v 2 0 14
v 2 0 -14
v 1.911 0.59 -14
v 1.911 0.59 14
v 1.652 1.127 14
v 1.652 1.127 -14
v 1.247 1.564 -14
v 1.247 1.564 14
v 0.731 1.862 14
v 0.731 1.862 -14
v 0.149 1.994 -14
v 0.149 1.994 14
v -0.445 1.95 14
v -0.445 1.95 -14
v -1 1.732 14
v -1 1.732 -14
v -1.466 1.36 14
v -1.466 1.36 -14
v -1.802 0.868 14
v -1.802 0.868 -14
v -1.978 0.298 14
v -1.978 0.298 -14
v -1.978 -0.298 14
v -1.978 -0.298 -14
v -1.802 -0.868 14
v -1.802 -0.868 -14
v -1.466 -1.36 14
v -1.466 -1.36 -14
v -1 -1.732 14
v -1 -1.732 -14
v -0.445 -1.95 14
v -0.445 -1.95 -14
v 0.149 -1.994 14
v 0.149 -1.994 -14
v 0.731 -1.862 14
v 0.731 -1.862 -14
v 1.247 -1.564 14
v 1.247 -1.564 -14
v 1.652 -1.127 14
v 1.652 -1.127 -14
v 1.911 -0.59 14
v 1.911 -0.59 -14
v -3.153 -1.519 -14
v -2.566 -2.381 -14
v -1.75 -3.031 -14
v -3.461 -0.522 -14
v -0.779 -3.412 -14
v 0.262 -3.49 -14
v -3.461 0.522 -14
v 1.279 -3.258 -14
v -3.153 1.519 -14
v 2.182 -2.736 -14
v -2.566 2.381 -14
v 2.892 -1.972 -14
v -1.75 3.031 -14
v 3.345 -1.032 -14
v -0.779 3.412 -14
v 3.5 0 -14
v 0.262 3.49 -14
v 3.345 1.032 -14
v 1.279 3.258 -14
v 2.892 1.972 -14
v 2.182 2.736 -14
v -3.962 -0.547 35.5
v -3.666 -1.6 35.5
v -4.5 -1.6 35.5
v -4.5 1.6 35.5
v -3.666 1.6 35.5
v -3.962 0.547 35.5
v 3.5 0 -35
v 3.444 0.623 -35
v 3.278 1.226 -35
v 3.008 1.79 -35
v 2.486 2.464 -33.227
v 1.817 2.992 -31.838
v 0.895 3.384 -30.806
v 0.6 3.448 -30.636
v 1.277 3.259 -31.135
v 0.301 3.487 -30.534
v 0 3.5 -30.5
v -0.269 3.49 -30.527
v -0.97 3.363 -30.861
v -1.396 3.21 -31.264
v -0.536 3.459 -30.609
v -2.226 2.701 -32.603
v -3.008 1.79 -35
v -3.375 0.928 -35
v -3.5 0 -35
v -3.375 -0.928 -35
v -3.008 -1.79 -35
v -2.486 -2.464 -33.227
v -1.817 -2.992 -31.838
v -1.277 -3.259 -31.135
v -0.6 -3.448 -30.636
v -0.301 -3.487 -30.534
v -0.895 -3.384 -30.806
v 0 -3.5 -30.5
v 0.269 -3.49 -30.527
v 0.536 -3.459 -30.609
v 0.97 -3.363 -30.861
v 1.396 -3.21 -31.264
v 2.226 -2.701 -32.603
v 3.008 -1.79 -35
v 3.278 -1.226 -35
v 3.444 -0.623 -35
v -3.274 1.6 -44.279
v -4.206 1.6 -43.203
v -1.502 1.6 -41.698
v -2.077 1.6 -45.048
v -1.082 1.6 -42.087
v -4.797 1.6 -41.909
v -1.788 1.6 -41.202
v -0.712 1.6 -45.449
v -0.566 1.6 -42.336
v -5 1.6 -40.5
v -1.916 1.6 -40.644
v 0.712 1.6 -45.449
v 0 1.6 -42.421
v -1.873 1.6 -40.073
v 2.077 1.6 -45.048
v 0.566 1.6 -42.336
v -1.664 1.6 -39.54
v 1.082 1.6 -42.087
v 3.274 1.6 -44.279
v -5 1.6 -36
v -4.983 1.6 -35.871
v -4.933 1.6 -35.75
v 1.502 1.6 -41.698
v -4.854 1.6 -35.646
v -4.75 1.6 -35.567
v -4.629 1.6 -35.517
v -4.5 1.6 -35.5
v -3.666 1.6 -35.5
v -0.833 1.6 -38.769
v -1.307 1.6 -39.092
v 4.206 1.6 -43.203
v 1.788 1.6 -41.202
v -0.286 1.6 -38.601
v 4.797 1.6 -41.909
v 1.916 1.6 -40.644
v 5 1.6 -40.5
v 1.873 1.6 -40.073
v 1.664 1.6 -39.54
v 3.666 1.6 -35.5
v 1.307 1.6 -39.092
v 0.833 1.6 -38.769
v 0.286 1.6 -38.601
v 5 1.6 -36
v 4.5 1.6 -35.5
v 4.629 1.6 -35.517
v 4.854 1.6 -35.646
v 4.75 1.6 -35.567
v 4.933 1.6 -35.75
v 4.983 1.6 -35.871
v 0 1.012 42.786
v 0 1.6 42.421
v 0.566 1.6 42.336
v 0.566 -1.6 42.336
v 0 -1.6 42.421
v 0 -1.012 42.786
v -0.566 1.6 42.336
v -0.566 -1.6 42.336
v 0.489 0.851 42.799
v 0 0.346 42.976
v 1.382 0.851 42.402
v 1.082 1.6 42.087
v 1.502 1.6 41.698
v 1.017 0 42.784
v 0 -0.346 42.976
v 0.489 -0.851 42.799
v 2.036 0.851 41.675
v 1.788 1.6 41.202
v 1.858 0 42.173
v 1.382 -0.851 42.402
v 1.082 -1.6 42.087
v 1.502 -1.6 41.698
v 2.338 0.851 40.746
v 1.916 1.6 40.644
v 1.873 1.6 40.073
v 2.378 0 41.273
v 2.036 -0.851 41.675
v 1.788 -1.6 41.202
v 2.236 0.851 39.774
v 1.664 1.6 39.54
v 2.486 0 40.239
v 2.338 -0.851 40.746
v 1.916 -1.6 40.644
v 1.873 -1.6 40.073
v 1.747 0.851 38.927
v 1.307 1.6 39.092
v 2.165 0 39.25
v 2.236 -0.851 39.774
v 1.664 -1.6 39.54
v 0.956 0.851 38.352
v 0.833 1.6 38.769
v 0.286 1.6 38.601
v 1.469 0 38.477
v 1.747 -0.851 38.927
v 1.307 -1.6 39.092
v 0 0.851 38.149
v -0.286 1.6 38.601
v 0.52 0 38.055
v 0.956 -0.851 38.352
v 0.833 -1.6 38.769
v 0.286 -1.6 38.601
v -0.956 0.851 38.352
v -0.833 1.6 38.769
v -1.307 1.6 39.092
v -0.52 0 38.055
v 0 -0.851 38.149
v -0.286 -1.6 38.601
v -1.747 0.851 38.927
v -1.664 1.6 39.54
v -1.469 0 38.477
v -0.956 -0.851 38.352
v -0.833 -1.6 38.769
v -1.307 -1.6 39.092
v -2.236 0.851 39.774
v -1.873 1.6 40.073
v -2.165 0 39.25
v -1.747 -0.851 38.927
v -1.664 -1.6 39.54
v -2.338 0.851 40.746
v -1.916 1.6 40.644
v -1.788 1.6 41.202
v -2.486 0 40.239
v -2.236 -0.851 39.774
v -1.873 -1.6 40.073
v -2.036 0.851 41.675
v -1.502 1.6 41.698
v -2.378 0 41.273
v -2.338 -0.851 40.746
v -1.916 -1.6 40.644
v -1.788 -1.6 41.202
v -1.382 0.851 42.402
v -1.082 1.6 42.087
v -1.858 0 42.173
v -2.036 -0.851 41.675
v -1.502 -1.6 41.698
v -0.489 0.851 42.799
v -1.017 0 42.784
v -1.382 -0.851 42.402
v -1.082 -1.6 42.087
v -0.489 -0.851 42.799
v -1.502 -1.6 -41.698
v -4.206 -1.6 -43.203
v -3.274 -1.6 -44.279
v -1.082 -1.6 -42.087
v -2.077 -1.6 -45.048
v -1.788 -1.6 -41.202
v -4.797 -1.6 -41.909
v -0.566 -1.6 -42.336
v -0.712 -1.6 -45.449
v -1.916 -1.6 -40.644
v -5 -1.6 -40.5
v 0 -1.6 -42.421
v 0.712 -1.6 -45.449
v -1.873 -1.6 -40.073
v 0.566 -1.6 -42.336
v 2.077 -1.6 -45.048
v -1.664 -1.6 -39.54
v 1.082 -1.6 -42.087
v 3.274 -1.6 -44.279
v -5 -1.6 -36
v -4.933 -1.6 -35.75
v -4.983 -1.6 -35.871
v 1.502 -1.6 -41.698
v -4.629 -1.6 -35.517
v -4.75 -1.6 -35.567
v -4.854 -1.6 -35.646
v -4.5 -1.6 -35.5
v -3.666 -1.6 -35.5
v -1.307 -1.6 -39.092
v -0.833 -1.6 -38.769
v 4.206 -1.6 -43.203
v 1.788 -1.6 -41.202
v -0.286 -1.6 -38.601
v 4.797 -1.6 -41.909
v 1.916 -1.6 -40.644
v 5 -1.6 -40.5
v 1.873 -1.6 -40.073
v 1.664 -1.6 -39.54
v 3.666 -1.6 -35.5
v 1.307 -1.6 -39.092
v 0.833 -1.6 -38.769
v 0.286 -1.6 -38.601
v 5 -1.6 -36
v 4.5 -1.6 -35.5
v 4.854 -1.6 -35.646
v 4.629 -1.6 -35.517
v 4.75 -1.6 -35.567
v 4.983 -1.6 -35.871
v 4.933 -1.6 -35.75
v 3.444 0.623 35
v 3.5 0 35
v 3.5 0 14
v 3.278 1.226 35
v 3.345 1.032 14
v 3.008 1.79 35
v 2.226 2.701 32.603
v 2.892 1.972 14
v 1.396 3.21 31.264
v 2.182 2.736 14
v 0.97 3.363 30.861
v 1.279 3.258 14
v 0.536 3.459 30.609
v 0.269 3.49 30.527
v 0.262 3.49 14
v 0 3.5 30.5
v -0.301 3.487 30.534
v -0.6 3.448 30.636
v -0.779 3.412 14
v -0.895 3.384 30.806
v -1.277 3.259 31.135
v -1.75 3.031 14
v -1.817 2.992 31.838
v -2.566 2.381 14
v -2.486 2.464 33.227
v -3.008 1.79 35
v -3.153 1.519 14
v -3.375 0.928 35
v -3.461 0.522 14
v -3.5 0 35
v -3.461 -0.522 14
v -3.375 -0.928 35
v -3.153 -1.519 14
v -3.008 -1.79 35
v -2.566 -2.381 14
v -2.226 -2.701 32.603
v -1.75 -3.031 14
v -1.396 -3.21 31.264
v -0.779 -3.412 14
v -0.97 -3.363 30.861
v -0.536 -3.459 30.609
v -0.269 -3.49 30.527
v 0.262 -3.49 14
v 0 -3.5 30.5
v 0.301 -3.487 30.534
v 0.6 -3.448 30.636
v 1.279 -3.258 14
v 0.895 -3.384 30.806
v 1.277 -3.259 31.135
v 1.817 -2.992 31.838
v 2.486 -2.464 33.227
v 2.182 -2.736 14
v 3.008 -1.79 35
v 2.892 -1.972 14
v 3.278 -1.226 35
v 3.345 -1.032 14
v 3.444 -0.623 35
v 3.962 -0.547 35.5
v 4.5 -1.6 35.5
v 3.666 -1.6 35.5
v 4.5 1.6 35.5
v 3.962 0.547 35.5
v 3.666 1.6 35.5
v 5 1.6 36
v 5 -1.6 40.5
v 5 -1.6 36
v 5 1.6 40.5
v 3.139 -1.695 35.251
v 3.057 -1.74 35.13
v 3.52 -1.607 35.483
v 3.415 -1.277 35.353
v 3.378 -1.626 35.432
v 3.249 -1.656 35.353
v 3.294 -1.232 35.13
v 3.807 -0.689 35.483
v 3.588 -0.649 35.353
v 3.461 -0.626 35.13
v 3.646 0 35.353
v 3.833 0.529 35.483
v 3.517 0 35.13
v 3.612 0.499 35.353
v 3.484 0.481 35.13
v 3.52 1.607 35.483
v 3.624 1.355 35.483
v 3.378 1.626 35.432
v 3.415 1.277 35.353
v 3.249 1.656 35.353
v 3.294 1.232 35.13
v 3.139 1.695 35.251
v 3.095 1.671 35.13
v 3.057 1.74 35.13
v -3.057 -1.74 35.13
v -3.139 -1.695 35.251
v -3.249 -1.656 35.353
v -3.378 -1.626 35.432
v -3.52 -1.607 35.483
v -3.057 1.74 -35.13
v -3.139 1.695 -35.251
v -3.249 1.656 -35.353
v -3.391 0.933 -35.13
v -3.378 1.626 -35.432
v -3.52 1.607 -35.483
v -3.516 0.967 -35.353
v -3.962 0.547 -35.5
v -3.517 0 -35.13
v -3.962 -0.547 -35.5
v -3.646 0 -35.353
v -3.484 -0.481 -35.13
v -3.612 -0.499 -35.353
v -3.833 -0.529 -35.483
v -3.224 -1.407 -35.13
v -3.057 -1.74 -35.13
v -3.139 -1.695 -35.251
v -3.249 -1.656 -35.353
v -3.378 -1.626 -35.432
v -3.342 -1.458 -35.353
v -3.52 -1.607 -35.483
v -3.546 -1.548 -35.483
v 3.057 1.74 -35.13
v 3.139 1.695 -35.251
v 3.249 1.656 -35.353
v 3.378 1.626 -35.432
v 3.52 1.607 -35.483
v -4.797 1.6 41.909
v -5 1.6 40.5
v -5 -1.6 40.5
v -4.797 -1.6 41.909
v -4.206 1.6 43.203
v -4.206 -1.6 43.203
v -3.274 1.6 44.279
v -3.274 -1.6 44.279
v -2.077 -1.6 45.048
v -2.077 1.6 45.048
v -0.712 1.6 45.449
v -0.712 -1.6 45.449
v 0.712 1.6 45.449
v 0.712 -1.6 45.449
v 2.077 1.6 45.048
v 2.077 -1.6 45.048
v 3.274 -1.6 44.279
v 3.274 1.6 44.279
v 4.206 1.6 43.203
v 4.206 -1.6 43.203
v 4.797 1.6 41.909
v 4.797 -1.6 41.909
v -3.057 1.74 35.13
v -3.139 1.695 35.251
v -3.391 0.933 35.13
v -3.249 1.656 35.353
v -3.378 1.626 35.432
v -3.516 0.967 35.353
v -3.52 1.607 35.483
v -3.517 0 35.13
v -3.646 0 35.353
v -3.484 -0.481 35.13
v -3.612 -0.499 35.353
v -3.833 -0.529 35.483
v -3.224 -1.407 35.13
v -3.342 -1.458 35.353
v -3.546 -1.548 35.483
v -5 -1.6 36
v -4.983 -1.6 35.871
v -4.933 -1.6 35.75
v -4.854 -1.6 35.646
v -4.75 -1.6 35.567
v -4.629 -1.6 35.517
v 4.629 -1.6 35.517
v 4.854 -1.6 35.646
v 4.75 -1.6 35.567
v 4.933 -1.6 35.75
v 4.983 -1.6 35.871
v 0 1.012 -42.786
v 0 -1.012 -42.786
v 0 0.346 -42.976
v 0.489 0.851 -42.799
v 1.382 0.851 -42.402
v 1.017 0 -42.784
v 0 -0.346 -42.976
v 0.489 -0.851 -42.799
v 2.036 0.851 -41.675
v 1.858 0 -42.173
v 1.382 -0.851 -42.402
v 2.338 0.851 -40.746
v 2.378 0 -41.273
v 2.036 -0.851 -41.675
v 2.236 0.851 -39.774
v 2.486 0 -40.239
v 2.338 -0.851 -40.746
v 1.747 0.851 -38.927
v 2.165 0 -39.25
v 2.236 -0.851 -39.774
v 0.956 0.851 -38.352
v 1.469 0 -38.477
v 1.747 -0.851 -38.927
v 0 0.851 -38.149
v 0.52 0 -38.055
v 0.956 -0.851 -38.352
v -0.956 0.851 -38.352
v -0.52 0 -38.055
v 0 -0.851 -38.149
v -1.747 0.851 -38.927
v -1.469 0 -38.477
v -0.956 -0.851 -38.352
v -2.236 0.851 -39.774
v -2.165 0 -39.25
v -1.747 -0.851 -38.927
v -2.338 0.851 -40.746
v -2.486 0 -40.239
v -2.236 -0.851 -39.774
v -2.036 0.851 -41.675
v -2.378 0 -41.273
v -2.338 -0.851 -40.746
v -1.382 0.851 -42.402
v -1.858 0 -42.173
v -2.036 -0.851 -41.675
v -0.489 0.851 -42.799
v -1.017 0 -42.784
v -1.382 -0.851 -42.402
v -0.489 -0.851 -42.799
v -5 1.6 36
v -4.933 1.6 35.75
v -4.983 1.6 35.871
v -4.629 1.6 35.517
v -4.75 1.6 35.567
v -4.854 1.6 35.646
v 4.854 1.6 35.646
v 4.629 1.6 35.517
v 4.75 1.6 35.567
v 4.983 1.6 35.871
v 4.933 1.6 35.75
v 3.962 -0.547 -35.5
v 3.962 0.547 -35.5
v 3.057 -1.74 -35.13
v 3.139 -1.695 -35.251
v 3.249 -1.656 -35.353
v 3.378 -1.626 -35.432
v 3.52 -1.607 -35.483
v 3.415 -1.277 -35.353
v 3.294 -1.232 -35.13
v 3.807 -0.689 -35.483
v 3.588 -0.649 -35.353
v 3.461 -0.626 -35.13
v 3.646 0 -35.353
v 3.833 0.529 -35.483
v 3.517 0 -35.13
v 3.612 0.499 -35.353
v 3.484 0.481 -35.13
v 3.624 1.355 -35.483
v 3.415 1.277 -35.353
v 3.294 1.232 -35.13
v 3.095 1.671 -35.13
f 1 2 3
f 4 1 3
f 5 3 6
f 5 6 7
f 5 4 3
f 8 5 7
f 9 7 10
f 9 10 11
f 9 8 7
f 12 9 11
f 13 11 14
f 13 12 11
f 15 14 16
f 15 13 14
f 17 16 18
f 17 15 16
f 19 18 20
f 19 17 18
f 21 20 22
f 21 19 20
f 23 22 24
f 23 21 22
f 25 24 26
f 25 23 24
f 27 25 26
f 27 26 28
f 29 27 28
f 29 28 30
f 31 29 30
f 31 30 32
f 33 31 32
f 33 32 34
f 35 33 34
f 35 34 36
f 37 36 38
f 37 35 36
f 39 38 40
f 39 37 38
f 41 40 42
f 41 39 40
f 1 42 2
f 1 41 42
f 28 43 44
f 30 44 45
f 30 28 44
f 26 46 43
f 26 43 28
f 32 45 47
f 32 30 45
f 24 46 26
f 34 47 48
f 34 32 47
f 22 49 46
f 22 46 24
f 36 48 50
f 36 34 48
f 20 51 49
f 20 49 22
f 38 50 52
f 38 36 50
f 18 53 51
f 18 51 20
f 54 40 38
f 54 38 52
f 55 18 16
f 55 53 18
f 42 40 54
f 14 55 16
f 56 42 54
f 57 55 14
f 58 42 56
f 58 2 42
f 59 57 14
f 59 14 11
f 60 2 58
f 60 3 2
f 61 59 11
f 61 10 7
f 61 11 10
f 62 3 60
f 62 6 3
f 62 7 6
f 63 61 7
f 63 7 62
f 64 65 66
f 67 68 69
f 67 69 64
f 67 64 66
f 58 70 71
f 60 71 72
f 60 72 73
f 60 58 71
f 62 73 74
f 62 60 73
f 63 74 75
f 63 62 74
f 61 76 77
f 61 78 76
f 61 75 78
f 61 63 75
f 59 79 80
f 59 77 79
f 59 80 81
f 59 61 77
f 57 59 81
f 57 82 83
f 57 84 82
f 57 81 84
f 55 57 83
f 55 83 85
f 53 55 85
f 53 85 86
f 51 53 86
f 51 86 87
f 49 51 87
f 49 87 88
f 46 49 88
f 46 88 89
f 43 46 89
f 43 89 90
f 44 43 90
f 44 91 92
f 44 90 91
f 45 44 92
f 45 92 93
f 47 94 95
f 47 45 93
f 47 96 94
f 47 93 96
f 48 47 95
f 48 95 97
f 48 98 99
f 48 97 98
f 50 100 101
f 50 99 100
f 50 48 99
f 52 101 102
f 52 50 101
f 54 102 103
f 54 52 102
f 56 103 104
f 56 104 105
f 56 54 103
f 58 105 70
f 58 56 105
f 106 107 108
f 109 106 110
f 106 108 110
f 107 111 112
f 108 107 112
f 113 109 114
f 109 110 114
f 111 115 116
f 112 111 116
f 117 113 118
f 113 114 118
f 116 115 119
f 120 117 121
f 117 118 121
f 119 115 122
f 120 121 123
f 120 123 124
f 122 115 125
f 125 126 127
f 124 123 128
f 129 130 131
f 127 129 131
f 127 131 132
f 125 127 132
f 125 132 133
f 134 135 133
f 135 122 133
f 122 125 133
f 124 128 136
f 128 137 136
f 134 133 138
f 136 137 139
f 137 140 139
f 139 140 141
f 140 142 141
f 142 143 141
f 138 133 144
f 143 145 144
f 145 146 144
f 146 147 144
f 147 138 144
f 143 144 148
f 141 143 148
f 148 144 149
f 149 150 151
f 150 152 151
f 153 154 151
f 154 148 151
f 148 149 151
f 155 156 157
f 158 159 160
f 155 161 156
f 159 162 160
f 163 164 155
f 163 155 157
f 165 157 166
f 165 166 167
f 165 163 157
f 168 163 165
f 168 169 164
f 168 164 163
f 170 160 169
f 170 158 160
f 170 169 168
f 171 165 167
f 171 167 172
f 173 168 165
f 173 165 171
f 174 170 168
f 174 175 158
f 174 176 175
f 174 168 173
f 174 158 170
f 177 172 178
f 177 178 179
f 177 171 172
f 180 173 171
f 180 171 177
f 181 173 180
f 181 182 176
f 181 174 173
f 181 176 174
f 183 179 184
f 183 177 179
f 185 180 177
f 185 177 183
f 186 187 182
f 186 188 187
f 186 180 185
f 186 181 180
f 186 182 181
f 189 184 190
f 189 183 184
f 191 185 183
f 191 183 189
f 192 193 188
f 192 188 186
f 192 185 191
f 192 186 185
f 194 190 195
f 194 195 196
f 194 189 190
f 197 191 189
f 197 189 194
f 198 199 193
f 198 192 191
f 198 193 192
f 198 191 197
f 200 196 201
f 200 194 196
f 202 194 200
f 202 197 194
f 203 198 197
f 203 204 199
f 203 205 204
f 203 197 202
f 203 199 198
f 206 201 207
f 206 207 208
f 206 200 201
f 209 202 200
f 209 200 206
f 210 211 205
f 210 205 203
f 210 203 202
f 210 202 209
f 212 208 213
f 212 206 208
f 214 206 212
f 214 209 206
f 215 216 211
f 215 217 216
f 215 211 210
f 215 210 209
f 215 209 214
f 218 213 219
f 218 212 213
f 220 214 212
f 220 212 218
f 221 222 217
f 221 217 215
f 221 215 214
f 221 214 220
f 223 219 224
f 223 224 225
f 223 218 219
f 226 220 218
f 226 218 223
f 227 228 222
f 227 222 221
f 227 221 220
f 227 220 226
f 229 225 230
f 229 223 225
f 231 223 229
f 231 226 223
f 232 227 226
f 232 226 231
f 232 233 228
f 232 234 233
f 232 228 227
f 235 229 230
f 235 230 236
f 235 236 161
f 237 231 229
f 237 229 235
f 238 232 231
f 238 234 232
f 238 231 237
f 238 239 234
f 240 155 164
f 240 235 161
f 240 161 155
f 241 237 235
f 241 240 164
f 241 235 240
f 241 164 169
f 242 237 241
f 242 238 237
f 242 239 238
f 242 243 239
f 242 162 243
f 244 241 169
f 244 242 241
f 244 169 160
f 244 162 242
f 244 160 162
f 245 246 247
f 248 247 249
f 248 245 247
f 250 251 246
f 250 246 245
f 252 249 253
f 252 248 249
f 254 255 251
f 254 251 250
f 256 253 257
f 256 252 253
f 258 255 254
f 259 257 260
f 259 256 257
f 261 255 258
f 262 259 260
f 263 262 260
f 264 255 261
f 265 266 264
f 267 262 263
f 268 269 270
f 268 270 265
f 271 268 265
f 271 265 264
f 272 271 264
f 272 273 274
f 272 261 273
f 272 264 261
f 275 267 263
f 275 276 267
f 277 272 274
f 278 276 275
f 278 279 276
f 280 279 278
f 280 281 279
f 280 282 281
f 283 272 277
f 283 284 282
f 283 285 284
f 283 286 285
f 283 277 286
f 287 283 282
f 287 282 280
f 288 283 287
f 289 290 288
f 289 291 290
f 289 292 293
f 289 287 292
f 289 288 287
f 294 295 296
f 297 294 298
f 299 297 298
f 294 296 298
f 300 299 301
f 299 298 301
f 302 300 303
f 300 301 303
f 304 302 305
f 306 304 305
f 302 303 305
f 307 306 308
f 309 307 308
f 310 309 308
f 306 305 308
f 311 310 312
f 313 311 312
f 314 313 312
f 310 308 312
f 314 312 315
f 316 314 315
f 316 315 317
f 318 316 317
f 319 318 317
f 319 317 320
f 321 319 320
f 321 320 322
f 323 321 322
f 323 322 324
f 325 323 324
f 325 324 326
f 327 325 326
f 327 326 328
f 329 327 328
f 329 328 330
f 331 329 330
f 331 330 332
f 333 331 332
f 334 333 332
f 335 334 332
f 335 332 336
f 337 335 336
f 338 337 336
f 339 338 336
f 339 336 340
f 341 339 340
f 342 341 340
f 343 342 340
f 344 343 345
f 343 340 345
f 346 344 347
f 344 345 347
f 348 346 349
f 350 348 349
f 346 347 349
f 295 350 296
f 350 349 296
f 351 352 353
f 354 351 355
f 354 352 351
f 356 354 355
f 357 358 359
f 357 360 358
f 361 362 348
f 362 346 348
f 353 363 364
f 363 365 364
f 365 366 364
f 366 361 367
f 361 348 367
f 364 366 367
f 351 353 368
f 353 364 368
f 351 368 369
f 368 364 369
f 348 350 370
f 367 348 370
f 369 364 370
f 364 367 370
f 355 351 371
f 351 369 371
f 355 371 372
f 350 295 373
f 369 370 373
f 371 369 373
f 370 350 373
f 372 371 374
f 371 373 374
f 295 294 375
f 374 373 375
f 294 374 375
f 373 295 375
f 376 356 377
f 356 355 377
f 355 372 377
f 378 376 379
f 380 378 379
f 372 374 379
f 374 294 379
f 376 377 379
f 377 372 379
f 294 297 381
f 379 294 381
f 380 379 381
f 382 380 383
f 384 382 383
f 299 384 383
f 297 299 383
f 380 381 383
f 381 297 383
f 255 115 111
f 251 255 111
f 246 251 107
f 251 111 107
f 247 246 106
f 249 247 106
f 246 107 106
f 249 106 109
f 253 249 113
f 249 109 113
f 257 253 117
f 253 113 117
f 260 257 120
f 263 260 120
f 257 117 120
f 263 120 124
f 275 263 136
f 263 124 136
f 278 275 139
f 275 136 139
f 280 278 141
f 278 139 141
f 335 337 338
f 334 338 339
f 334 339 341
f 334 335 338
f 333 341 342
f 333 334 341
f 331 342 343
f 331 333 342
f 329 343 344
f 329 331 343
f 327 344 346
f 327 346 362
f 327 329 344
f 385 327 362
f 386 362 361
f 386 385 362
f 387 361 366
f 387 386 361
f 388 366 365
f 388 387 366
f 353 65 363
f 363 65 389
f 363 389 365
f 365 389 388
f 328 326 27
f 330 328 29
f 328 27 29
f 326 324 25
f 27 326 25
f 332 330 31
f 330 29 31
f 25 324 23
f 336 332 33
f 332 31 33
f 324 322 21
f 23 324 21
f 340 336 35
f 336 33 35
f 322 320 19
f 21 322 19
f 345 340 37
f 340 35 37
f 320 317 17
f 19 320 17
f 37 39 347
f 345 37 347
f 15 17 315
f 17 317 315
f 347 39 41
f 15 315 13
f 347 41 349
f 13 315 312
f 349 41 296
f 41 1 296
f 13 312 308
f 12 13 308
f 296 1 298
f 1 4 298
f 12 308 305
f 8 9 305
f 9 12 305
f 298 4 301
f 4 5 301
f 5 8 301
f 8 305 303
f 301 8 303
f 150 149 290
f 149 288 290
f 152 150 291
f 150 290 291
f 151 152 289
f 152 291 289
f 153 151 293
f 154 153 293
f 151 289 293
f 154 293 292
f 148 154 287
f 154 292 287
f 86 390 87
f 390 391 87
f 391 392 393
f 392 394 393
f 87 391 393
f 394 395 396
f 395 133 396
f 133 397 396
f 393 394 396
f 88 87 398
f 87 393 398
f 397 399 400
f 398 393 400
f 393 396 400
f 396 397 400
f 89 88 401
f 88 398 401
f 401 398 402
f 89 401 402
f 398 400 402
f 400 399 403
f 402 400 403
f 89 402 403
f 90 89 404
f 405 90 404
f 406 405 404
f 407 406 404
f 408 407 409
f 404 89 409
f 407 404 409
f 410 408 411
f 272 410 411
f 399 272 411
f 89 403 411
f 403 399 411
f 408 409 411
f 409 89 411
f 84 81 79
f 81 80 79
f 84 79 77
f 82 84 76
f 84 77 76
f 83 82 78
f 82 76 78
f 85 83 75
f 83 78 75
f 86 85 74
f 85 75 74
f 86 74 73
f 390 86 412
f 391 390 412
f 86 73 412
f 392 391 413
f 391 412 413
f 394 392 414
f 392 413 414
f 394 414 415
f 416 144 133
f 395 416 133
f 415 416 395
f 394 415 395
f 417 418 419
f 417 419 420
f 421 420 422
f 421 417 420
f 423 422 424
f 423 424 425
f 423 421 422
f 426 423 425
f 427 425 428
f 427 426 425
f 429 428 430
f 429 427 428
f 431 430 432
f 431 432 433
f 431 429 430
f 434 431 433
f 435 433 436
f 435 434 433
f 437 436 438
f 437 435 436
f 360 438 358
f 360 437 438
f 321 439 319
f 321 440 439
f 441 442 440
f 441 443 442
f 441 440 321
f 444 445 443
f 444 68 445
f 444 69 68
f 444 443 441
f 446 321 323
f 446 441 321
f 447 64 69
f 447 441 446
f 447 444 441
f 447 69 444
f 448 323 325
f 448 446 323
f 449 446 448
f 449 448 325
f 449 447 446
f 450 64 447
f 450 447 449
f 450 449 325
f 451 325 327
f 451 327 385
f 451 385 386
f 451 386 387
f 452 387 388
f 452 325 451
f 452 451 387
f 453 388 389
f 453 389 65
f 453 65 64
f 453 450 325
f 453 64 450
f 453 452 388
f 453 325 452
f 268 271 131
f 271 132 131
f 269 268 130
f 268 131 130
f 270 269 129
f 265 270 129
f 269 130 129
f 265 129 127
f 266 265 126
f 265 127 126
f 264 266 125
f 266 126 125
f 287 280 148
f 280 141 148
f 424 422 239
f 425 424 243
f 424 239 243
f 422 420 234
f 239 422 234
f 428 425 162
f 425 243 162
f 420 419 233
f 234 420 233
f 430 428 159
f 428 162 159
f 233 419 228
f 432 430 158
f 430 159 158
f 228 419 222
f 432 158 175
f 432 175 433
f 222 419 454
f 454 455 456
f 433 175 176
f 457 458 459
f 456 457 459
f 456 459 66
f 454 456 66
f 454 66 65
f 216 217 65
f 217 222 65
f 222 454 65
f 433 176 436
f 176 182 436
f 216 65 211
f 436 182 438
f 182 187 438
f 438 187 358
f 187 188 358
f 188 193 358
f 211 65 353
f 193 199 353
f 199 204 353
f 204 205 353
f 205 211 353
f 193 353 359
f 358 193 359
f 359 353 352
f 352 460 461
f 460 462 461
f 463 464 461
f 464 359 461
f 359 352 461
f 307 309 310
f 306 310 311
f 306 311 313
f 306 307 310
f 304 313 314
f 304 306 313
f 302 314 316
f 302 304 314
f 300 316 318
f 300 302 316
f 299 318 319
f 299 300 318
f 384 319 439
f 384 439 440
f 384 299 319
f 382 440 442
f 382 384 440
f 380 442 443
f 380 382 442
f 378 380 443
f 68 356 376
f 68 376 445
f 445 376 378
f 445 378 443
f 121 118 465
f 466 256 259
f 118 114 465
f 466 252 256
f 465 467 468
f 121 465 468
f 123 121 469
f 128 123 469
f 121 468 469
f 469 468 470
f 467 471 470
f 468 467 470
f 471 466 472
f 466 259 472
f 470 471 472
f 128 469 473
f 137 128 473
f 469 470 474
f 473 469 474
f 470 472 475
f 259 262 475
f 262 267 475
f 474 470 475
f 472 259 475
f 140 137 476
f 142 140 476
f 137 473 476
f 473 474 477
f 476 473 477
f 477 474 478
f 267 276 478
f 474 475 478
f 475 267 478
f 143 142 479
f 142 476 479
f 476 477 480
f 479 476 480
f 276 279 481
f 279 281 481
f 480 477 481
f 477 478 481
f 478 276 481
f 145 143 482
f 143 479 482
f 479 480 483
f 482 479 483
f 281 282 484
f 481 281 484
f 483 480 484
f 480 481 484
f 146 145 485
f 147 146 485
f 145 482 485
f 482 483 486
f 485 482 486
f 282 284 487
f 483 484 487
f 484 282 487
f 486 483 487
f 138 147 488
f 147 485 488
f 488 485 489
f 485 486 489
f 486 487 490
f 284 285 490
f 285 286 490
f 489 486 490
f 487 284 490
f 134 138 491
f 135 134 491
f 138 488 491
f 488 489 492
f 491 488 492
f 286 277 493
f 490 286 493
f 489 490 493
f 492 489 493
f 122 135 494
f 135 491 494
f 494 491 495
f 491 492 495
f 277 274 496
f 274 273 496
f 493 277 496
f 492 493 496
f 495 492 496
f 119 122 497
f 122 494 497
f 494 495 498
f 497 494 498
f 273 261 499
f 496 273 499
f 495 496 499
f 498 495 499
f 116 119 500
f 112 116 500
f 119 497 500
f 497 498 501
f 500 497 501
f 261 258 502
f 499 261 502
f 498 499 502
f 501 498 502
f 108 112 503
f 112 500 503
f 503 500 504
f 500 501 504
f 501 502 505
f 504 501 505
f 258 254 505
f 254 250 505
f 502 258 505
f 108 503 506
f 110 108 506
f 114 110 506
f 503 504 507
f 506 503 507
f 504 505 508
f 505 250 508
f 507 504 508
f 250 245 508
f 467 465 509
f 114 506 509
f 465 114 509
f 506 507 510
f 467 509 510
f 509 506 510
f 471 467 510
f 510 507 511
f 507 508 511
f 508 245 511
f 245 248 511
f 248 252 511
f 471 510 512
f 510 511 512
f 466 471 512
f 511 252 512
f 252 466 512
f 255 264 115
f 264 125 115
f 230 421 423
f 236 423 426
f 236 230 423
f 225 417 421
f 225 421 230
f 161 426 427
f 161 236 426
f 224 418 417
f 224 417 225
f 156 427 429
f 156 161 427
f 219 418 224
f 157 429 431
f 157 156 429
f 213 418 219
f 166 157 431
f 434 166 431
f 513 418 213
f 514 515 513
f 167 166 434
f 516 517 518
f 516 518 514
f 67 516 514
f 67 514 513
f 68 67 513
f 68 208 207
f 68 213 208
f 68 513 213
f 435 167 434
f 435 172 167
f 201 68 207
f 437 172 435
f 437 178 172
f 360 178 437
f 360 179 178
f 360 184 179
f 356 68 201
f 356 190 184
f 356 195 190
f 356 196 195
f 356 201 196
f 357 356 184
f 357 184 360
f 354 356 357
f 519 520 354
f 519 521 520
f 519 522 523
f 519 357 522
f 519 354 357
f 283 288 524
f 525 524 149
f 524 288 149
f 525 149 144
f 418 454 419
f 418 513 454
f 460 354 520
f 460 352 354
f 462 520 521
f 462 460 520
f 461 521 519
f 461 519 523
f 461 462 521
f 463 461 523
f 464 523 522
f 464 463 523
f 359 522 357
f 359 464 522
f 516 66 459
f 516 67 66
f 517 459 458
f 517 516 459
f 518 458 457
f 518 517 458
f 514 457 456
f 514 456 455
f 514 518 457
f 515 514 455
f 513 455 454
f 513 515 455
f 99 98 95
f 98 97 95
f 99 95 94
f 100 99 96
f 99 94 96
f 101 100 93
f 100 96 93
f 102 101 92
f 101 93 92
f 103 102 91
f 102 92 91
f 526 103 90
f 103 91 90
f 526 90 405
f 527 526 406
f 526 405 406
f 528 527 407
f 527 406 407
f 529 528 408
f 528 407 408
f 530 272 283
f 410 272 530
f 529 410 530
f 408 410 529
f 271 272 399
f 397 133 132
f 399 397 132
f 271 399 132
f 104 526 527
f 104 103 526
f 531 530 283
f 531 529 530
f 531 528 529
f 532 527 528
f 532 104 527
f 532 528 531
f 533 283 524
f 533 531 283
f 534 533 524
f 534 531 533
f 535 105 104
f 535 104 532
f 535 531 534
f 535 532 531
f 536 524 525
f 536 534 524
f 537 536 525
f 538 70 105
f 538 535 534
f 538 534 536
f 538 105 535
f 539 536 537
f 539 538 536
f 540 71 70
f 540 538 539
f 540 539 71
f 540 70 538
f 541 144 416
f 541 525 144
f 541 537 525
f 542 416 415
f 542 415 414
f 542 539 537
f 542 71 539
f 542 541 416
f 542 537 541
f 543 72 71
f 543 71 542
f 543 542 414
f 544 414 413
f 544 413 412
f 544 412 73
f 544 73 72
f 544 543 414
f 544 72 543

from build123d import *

# Parameters (mm, degrees)
SKETCH1_R                  = 2
SCREW_SECTION_DEPTH        = 14
SKETCH2_R                  = 3.5
BAR_SECTION_DEPTH          = 21.5
MOUNT_SECTION_DEPTH        = 1.6
BAR_TAPER_DEPTH            = 6
MOUNT_FILLET_R             = 0.5
MOUNT_FILLET_OF_MIRROR_2_R = 0.5


with BuildPart() as part:
    # Sketch1 → Screw Section (new body)
    with BuildSketch(Plane.XY):
        Circle(SKETCH1_R)
    screw_section = extrude(amount=SCREW_SECTION_DEPTH)

    # Sketch2 → Bar Section (add)
    with BuildSketch(Plane.XY.offset(14)):
        Circle(SKETCH2_R)
    bar_section = extrude(amount=BAR_SECTION_DEPTH)

    # Sketch3 → Mount Section (add, symmetric)
    with BuildSketch(Plane(origin=(0, 0, 0), x_dir=(1, 0, 0), z_dir=(0, 1, 0))):
        with BuildLine():
            Line((5, -35.5), (-5, -35.5))
            Line((-5, -35.5), (-5, -40.5))
            ThreePointArc((-5, -40.5), (0, -45.5), (5, -40.5))
            Line((5, -40.5), (5, -35.5))
        make_face()
    mount_section = extrude(amount=MOUNT_SECTION_DEPTH, both=True)

    # Sketch4 → Bar Taper (cut, symmetric)
    with BuildSketch(Plane(origin=(0, 0, 0), x_dir=(0, 0, -1), z_dir=(1, 0, 0))):
        Polygon((-30.5, -3.5), (-35.5, -1.6), (-35.5, -3.5), align=None)
        Polygon((-30.5, 3.5), (-35.5, 1.6), (-35.5, 3.5), align=None)
    bar_taper = extrude(amount=BAR_TAPER_DEPTH, both=True, mode=Mode.SUBTRACT)

    # Mount Fillet
    mount_fillet_edges = [part.edges().sort_by_distance(p)[0] for p in [
        (-5, 0, 35.5),
        (3.401842713, -0.823083322, 35.5),
        (-3.5, 0, 35.5),
        (5, 0, 35.5),
    ]]
    fillet(mount_fillet_edges, radius=MOUNT_FILLET_R)

    # Sketch6 → Ball Hole (revolve, cut)
    with BuildSketch(Plane(origin=(0, 0, 0), x_dir=(0, 0, -1), z_dir=(1, 0, 0))):
        with BuildLine():
            Line((-42.420937271, -1.6), (-40.5, -1.6))
            Line((-40.5, -1.6), (-40.5, 1.6))
            Line((-40.5, 1.6), (-42.420937271, 1.6))
            ThreePointArc((-42.420937271, 1.6), (-43, 0), (-42.420937271, -1.6))
        make_face()
    ball_hole = revolve(axis=Axis((0, -1.6, 40.5), (0, 1, 0)), mode=Mode.SUBTRACT)

    # Mirror 2: Screw Section, Bar Section, Mount Section, Bar Taper, Ball Hole across Front Plane
    add(screw_section.mirror(Plane.XY))
    add(bar_section.mirror(Plane.XY))
    add(mount_section.mirror(Plane.XY))
    add(bar_taper.mirror(Plane.XY), mode=Mode.SUBTRACT)
    add(ball_hole.mirror(Plane.XY), mode=Mode.SUBTRACT)

    # Mount Fillet of Mirror 2
    mount_fillet_of_mirror_2_edges = [part.edges().sort_by_distance(p)[0] for p in [
        (-5, 0, -35.5),
        (3.401842713, -0.823083322, -35.5),
        (-3.5, 0, -35.5),
        (5, 0, -35.5),
    ]]
    fillet(mount_fillet_of_mirror_2_edges, radius=MOUNT_FILLET_OF_MIRROR_2_R)


solid = part.part
